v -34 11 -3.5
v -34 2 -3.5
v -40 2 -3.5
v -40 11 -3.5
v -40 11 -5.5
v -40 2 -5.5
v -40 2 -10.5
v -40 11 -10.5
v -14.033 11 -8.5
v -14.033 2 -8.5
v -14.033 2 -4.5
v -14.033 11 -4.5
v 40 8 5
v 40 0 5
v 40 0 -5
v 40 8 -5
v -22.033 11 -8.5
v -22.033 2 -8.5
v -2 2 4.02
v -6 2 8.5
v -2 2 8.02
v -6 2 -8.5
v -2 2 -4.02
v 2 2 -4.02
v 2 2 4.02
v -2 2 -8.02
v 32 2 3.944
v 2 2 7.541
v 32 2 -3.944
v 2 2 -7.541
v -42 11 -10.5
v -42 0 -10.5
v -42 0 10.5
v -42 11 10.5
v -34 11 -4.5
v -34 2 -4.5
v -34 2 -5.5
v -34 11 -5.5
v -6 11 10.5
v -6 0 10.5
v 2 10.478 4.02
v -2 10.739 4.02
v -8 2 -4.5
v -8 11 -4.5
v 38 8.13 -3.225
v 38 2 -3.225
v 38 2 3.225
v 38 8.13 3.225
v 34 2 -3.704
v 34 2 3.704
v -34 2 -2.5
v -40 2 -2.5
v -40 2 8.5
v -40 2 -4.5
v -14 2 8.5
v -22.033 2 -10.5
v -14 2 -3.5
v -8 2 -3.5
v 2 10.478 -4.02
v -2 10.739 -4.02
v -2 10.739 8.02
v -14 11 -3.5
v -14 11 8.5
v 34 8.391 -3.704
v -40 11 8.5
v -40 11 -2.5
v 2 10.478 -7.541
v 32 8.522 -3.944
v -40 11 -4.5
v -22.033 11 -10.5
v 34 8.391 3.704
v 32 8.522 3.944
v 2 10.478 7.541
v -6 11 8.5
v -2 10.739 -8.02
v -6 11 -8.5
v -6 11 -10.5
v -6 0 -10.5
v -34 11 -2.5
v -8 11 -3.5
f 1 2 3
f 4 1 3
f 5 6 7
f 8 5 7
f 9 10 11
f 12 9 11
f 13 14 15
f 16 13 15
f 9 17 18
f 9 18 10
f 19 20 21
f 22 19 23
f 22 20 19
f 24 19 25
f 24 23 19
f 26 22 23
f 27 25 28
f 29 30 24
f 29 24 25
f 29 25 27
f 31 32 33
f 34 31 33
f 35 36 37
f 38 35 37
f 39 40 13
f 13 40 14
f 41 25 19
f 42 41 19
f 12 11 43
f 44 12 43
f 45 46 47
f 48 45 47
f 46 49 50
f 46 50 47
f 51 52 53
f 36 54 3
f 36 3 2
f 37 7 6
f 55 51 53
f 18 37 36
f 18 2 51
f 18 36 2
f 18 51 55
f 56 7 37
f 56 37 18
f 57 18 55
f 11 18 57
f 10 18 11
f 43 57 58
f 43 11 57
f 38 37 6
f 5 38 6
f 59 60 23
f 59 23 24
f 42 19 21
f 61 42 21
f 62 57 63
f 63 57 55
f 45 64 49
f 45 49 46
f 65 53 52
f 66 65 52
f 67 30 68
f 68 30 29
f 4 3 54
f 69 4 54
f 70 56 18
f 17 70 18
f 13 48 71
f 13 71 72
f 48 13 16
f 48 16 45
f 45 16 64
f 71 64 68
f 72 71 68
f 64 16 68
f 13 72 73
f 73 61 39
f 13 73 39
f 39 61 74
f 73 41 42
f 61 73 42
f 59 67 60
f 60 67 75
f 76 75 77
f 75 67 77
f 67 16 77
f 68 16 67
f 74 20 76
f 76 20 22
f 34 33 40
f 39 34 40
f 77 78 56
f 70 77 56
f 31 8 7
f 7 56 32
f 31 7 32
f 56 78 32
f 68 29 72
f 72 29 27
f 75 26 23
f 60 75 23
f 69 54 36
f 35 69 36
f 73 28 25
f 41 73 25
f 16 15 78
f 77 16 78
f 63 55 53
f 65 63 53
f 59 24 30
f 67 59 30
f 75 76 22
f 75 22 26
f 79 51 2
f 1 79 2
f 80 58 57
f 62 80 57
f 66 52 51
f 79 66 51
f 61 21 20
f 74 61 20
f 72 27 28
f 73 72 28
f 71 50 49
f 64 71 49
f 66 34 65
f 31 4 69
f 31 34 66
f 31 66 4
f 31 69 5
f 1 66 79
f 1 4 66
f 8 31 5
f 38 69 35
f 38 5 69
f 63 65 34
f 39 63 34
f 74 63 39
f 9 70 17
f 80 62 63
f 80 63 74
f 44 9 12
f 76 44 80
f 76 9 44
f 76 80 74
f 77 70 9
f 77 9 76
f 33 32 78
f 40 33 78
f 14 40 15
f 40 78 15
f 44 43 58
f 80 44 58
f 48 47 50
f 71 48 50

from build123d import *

# Parameters (mm, degrees)
BOSS_EXTRUDE1_DEPTH     = 2
BOSS_EXTRUDE2_DEPTH     = 11
CUT_EXTRUDE1_DEPTH      = 11
CUT_EXTRUDE1_DEPTH_BACK = 11


with BuildPart() as part:
    # Sketch1 → Boss-Extrude1 (new body)
    with BuildSketch(Plane(origin=(0, 0, 0), x_dir=(1, 0, 0), z_dir=(0, 1, 0))):
        Polygon((-42, 10.5), (-42, -10.5), (-6, -10.5), (40, -5), (40, 5), (-6, 10.5), align=None)
    extrude(amount=BOSS_EXTRUDE1_DEPTH)

    # Sketch1<5> → Boss-Extrude2 (add)
    with BuildSketch(Plane(origin=(0, 0, 0), x_dir=(1, 0, 0), z_dir=(0, 1, 0))):
        Polygon((-40, 10.5), (-42, 10.5), (-42, -10.5), (-6, -10.5), (40, -5), (40, 5), (-6, 10.5), (-22.03308425, 10.5), (-22.03308425, 8.5), (-14.03308425, 8.5), (-14.03308425, 4.5), (-8, 4.5), (-8, 3.5), (-14, 3.5), (-14, -8.5), (-40, -8.5), (-40, 2.5), (-34, 2.5), (-34, 3.5), (-40, 3.5), (-40, 4.5), (-34, 4.5), (-34, 5.5), (-40, 5.5), align=None)
        Polygon((-6, -8.5), (-6, 8.5), (-2, 8.02044412), (-2, 4.02044412), (2, 4.02044412), (2, 7.540888241), (32, 3.944219144), (32, -3.944219144), (2, -7.540888241), (2, -4.02044412), (-2, -4.02044412), (-2, -8.02044412), align=None, mode=Mode.SUBTRACT)
        Polygon((38, -3.224885324), (34, -3.704441204), (34, 3.704441204), (38, 3.224885324), align=None, mode=Mode.SUBTRACT)
    extrude(amount=BOSS_EXTRUDE2_DEPTH)

    # Sketch2 → Cut-Extrude1 (cut, two sides: drawn at the far end of the back side and taken through both)
    with BuildSketch(Plane.XY.offset(-CUT_EXTRUDE1_DEPTH_BACK)):
        Polygon((-6, 11), (40, 11), (40, 8), align=None)
    extrude(amount=CUT_EXTRUDE1_DEPTH + CUT_EXTRUDE1_DEPTH_BACK, mode=Mode.SUBTRACT)


solid = part.part
